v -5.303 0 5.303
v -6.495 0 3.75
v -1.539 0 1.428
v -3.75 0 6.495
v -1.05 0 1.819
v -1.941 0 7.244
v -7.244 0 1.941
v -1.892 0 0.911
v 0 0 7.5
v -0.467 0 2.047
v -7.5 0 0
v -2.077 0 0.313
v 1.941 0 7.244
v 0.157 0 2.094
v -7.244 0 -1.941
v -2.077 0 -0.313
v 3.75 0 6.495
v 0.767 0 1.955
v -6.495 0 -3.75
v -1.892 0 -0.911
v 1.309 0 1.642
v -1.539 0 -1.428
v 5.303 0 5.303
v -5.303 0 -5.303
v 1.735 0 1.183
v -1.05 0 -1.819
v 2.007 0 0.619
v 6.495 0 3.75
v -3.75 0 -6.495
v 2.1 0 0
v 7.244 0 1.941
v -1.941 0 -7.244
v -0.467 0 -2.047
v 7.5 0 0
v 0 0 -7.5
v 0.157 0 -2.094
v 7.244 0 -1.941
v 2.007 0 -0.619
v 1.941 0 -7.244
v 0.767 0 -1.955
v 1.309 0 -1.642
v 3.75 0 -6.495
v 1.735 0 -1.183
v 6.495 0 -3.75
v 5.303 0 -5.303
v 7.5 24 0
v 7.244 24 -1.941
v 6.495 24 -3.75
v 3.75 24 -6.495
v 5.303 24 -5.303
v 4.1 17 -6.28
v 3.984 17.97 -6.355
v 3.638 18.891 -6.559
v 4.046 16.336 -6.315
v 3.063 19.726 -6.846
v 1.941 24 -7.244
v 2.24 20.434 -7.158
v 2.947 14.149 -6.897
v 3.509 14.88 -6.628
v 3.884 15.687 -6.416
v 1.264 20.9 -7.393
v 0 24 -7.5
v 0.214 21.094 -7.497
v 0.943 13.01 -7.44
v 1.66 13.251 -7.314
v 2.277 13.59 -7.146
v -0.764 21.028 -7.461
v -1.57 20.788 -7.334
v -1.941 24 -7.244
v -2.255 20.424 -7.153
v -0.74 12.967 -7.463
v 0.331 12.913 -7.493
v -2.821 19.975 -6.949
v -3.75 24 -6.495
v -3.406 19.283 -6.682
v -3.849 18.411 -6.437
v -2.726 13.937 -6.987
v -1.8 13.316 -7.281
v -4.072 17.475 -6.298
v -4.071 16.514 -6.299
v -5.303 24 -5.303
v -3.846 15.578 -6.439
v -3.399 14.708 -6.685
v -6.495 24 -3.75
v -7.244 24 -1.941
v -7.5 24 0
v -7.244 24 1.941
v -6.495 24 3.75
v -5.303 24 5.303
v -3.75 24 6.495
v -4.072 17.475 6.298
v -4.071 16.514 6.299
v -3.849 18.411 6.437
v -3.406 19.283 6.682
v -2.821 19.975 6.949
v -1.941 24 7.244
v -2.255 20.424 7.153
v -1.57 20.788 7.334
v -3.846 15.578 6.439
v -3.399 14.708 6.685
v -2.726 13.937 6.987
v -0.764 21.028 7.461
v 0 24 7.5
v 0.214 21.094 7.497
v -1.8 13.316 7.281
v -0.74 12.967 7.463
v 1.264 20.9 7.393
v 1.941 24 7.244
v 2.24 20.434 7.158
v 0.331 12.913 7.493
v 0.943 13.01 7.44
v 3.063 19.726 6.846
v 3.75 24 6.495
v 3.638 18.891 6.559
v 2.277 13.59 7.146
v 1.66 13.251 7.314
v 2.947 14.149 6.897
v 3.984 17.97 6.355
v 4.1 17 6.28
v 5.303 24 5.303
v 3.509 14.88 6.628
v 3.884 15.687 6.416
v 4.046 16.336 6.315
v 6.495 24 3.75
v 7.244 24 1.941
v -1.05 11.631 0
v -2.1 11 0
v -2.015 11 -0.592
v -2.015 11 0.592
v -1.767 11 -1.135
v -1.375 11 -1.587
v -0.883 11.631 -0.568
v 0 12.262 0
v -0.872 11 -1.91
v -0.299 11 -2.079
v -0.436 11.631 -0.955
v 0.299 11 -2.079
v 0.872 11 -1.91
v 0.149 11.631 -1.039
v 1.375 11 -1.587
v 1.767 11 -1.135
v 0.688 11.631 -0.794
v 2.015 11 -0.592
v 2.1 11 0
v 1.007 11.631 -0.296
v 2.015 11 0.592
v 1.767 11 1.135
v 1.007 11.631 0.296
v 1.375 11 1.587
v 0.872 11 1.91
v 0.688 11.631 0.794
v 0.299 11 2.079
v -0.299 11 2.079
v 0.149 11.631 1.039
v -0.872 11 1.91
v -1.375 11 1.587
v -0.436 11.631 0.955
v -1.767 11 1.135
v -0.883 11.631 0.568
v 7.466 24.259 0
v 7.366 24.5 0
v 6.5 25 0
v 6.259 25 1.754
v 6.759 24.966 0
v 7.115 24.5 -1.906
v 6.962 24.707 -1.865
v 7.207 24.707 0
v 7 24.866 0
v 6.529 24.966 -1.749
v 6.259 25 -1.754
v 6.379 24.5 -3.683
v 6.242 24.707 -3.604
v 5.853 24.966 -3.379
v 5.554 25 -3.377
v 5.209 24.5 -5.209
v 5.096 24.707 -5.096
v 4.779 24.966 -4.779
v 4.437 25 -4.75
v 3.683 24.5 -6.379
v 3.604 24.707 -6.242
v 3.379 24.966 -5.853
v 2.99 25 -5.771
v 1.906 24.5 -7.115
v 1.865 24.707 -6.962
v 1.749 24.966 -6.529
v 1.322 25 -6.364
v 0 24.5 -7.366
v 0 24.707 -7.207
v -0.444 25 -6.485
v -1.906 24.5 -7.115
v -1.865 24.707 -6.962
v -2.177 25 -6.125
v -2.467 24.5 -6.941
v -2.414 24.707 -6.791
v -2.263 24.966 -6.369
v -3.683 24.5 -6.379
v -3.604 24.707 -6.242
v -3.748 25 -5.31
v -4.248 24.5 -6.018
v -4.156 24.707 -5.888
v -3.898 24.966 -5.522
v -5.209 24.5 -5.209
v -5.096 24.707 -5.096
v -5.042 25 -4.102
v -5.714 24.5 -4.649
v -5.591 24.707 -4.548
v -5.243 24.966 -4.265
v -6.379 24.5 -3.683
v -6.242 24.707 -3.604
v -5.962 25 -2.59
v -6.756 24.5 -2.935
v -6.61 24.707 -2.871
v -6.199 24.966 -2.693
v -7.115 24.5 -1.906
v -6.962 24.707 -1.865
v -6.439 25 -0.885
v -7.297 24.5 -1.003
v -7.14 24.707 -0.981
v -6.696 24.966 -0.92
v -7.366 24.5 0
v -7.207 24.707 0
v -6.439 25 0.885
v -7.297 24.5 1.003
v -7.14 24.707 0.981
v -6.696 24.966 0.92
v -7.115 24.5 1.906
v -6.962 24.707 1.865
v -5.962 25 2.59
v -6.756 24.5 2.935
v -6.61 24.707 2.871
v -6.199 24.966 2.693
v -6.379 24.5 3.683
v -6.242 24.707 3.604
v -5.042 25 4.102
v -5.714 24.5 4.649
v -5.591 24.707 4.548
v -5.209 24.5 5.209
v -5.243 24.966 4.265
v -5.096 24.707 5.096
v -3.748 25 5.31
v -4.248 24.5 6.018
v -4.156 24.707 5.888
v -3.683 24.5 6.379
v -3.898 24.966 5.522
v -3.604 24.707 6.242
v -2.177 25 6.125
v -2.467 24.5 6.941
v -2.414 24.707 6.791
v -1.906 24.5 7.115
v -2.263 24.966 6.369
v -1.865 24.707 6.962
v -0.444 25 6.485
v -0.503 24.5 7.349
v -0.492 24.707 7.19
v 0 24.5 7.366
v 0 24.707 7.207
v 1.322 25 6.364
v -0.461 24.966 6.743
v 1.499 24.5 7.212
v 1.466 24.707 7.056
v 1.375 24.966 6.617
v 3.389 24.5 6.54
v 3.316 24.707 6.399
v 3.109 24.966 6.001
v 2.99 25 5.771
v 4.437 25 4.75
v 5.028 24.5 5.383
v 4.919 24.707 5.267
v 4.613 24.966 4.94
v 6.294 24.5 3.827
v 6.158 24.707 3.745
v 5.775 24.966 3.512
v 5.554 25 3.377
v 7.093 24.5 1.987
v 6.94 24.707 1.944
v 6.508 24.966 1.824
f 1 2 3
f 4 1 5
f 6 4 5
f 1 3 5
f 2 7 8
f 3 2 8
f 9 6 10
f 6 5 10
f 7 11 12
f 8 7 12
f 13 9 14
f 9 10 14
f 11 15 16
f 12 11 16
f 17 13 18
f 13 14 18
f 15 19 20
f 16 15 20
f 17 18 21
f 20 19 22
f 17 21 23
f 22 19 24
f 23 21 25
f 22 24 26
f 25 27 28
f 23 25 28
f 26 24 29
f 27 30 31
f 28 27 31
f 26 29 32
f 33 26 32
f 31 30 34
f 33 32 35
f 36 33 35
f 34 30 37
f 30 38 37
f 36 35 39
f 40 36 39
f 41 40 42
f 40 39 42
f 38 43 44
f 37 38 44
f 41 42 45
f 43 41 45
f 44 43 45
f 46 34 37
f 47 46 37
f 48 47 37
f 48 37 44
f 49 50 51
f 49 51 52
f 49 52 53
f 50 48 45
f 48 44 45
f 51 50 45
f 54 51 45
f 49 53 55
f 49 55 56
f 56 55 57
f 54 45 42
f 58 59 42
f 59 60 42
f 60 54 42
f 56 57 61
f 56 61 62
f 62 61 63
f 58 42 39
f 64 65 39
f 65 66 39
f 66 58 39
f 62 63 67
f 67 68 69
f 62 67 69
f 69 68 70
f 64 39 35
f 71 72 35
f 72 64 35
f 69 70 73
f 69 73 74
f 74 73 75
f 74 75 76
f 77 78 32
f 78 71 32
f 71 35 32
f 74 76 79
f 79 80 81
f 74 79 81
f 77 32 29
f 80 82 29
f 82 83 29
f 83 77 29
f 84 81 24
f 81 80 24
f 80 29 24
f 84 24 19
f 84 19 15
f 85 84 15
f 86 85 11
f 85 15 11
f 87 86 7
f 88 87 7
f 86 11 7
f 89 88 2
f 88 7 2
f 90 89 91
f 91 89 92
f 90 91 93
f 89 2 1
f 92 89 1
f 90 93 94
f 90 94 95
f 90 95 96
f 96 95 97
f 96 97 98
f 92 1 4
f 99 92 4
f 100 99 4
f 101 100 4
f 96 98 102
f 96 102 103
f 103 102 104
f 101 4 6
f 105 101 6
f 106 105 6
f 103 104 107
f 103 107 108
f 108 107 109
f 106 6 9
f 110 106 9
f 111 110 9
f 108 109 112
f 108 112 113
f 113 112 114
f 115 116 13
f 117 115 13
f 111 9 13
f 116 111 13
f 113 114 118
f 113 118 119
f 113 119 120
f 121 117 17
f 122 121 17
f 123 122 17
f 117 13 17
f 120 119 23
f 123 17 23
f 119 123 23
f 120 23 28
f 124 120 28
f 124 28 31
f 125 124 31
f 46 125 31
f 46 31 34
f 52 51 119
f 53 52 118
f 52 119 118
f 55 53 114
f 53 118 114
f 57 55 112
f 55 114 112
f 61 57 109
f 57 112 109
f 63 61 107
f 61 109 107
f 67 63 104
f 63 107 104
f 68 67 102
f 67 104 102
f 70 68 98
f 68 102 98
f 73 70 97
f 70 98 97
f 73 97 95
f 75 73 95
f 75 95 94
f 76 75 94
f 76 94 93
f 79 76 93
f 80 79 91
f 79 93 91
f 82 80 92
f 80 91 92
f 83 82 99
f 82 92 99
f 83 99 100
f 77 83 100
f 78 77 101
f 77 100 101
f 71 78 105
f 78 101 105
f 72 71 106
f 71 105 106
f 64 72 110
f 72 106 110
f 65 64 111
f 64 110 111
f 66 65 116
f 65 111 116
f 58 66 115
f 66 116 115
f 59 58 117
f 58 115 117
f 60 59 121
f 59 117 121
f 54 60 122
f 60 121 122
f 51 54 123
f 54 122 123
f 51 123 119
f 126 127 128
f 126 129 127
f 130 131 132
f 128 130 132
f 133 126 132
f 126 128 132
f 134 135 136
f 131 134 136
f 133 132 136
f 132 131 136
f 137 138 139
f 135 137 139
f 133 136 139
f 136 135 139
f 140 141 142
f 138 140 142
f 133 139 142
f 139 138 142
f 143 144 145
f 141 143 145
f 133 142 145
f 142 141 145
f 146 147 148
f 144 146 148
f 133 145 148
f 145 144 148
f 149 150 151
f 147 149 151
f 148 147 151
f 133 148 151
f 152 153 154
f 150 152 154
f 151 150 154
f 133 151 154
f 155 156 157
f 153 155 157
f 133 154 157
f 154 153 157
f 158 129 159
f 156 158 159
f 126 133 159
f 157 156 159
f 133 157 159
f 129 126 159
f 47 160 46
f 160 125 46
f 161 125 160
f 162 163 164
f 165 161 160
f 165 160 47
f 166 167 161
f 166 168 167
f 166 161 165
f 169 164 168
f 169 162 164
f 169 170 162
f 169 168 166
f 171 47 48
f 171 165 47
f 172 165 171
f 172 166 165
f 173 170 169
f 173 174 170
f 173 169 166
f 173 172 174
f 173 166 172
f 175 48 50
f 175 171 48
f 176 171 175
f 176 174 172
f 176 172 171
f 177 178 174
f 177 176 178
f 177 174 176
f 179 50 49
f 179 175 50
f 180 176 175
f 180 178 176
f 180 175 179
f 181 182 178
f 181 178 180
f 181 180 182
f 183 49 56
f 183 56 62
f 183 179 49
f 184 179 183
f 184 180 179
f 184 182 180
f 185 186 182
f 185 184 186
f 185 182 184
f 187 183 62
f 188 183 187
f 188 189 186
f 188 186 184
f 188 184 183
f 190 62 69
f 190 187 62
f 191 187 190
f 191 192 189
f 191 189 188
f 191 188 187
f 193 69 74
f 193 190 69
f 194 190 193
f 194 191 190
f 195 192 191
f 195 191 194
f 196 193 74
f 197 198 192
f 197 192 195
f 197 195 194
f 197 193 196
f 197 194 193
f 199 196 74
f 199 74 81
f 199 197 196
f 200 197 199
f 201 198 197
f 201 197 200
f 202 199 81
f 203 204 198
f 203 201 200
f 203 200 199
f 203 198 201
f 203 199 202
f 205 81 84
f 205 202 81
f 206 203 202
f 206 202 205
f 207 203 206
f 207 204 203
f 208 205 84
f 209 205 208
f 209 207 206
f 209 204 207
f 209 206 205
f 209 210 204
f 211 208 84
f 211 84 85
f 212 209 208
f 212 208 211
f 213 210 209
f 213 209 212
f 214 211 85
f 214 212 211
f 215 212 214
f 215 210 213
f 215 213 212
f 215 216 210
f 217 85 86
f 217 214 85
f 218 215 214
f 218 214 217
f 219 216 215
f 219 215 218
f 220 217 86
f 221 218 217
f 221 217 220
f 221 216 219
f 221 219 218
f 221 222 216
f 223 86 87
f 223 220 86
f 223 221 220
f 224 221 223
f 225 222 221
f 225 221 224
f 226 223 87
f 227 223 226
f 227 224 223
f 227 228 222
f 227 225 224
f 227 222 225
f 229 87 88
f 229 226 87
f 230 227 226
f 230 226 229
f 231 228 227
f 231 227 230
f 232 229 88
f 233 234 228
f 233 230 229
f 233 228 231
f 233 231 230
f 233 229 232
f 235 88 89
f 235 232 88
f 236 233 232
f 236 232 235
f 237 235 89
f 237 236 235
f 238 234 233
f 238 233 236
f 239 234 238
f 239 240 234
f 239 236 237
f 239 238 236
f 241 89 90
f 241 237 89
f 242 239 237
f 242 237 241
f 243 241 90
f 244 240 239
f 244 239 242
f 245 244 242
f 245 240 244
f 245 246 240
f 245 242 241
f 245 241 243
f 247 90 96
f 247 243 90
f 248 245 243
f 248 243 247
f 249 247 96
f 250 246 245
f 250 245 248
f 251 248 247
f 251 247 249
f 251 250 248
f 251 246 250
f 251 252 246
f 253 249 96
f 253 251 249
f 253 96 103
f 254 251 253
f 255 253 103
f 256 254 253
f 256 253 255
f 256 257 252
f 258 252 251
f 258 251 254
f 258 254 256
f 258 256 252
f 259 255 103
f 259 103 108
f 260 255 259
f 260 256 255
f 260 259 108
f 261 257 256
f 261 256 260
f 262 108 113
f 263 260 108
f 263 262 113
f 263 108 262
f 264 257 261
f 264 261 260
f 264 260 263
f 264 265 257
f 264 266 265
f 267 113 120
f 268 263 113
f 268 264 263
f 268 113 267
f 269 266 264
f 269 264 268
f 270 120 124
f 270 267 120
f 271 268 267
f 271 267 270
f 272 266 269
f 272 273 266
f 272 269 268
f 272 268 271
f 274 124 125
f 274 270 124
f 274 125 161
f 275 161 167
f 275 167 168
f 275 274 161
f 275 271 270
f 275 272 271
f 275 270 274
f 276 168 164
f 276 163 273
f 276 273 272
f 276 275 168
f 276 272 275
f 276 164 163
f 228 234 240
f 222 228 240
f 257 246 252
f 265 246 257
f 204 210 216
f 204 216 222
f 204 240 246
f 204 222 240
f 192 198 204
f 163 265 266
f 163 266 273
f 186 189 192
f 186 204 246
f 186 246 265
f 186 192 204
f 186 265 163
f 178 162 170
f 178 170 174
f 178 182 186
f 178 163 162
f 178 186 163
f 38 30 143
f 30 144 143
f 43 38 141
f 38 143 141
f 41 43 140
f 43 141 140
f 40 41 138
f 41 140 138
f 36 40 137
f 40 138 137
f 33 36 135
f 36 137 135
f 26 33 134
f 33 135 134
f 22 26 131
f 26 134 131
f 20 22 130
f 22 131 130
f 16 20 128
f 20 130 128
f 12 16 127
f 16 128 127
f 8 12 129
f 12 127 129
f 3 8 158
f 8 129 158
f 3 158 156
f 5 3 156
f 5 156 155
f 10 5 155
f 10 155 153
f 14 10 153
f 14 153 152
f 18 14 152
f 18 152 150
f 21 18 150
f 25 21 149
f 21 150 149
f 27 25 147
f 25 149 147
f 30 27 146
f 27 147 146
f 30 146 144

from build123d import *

# Parameters (mm, degrees)
SKETCH1_R               = 7.5
BOSS_EXTRUDE1_DEPTH     = 25
FILLET1_R               = 1
SKETCH2_R               = 4.1
CUT_EXTRUDE1_DEPTH      = 8.5
CUT_EXTRUDE1_DEPTH_BACK = 8.5
M5_TAPPED_HOLE1_D       = 4.2
M5_TAPPED_HOLE1_DEPTH   = 11
M5_TAPPED_HOLE1_TIP     = 1.2618073


with BuildPart() as part:
    # Sketch1 → Boss-Extrude1 (new body)
    with BuildSketch(Plane(origin=(0, 0, 0), x_dir=(1, 0, 0), z_dir=(0, 1, 0))):
        Circle(SKETCH1_R)
    extrude(amount=BOSS_EXTRUDE1_DEPTH)

    # Fillet1
    fillet1_edges = [part.edges().sort_by_distance(p)[0] for p in [
        (-7.5, 25, 0),
    ]]
    fillet(fillet1_edges, radius=FILLET1_R)

    # Sketch2 → Cut-Extrude1 (cut, two sides)
    with BuildSketch(Plane.XY) as cut_extrude1_sk:
        with Locations((0, 17)):
            Circle(SKETCH2_R)
    extrude(amount=CUT_EXTRUDE1_DEPTH, mode=Mode.SUBTRACT)
    extrude(cut_extrude1_sk.sketch, amount=-CUT_EXTRUDE1_DEPTH_BACK, mode=Mode.SUBTRACT)

    # M5 Tapped Hole1
    with Locations(Plane(origin=(0, 0, 0), x_dir=(-1, 0, 0), z_dir=(0, -1, 0))):
        with Locations((0, 0)):
            Hole(M5_TAPPED_HOLE1_D / 2, depth=M5_TAPPED_HOLE1_DEPTH)
            with Locations((0, 0, -(M5_TAPPED_HOLE1_DEPTH + M5_TAPPED_HOLE1_TIP / 2))):  # 118° drill point
                Cone(0, M5_TAPPED_HOLE1_D / 2, M5_TAPPED_HOLE1_TIP, mode=Mode.SUBTRACT)


solid = part.part
